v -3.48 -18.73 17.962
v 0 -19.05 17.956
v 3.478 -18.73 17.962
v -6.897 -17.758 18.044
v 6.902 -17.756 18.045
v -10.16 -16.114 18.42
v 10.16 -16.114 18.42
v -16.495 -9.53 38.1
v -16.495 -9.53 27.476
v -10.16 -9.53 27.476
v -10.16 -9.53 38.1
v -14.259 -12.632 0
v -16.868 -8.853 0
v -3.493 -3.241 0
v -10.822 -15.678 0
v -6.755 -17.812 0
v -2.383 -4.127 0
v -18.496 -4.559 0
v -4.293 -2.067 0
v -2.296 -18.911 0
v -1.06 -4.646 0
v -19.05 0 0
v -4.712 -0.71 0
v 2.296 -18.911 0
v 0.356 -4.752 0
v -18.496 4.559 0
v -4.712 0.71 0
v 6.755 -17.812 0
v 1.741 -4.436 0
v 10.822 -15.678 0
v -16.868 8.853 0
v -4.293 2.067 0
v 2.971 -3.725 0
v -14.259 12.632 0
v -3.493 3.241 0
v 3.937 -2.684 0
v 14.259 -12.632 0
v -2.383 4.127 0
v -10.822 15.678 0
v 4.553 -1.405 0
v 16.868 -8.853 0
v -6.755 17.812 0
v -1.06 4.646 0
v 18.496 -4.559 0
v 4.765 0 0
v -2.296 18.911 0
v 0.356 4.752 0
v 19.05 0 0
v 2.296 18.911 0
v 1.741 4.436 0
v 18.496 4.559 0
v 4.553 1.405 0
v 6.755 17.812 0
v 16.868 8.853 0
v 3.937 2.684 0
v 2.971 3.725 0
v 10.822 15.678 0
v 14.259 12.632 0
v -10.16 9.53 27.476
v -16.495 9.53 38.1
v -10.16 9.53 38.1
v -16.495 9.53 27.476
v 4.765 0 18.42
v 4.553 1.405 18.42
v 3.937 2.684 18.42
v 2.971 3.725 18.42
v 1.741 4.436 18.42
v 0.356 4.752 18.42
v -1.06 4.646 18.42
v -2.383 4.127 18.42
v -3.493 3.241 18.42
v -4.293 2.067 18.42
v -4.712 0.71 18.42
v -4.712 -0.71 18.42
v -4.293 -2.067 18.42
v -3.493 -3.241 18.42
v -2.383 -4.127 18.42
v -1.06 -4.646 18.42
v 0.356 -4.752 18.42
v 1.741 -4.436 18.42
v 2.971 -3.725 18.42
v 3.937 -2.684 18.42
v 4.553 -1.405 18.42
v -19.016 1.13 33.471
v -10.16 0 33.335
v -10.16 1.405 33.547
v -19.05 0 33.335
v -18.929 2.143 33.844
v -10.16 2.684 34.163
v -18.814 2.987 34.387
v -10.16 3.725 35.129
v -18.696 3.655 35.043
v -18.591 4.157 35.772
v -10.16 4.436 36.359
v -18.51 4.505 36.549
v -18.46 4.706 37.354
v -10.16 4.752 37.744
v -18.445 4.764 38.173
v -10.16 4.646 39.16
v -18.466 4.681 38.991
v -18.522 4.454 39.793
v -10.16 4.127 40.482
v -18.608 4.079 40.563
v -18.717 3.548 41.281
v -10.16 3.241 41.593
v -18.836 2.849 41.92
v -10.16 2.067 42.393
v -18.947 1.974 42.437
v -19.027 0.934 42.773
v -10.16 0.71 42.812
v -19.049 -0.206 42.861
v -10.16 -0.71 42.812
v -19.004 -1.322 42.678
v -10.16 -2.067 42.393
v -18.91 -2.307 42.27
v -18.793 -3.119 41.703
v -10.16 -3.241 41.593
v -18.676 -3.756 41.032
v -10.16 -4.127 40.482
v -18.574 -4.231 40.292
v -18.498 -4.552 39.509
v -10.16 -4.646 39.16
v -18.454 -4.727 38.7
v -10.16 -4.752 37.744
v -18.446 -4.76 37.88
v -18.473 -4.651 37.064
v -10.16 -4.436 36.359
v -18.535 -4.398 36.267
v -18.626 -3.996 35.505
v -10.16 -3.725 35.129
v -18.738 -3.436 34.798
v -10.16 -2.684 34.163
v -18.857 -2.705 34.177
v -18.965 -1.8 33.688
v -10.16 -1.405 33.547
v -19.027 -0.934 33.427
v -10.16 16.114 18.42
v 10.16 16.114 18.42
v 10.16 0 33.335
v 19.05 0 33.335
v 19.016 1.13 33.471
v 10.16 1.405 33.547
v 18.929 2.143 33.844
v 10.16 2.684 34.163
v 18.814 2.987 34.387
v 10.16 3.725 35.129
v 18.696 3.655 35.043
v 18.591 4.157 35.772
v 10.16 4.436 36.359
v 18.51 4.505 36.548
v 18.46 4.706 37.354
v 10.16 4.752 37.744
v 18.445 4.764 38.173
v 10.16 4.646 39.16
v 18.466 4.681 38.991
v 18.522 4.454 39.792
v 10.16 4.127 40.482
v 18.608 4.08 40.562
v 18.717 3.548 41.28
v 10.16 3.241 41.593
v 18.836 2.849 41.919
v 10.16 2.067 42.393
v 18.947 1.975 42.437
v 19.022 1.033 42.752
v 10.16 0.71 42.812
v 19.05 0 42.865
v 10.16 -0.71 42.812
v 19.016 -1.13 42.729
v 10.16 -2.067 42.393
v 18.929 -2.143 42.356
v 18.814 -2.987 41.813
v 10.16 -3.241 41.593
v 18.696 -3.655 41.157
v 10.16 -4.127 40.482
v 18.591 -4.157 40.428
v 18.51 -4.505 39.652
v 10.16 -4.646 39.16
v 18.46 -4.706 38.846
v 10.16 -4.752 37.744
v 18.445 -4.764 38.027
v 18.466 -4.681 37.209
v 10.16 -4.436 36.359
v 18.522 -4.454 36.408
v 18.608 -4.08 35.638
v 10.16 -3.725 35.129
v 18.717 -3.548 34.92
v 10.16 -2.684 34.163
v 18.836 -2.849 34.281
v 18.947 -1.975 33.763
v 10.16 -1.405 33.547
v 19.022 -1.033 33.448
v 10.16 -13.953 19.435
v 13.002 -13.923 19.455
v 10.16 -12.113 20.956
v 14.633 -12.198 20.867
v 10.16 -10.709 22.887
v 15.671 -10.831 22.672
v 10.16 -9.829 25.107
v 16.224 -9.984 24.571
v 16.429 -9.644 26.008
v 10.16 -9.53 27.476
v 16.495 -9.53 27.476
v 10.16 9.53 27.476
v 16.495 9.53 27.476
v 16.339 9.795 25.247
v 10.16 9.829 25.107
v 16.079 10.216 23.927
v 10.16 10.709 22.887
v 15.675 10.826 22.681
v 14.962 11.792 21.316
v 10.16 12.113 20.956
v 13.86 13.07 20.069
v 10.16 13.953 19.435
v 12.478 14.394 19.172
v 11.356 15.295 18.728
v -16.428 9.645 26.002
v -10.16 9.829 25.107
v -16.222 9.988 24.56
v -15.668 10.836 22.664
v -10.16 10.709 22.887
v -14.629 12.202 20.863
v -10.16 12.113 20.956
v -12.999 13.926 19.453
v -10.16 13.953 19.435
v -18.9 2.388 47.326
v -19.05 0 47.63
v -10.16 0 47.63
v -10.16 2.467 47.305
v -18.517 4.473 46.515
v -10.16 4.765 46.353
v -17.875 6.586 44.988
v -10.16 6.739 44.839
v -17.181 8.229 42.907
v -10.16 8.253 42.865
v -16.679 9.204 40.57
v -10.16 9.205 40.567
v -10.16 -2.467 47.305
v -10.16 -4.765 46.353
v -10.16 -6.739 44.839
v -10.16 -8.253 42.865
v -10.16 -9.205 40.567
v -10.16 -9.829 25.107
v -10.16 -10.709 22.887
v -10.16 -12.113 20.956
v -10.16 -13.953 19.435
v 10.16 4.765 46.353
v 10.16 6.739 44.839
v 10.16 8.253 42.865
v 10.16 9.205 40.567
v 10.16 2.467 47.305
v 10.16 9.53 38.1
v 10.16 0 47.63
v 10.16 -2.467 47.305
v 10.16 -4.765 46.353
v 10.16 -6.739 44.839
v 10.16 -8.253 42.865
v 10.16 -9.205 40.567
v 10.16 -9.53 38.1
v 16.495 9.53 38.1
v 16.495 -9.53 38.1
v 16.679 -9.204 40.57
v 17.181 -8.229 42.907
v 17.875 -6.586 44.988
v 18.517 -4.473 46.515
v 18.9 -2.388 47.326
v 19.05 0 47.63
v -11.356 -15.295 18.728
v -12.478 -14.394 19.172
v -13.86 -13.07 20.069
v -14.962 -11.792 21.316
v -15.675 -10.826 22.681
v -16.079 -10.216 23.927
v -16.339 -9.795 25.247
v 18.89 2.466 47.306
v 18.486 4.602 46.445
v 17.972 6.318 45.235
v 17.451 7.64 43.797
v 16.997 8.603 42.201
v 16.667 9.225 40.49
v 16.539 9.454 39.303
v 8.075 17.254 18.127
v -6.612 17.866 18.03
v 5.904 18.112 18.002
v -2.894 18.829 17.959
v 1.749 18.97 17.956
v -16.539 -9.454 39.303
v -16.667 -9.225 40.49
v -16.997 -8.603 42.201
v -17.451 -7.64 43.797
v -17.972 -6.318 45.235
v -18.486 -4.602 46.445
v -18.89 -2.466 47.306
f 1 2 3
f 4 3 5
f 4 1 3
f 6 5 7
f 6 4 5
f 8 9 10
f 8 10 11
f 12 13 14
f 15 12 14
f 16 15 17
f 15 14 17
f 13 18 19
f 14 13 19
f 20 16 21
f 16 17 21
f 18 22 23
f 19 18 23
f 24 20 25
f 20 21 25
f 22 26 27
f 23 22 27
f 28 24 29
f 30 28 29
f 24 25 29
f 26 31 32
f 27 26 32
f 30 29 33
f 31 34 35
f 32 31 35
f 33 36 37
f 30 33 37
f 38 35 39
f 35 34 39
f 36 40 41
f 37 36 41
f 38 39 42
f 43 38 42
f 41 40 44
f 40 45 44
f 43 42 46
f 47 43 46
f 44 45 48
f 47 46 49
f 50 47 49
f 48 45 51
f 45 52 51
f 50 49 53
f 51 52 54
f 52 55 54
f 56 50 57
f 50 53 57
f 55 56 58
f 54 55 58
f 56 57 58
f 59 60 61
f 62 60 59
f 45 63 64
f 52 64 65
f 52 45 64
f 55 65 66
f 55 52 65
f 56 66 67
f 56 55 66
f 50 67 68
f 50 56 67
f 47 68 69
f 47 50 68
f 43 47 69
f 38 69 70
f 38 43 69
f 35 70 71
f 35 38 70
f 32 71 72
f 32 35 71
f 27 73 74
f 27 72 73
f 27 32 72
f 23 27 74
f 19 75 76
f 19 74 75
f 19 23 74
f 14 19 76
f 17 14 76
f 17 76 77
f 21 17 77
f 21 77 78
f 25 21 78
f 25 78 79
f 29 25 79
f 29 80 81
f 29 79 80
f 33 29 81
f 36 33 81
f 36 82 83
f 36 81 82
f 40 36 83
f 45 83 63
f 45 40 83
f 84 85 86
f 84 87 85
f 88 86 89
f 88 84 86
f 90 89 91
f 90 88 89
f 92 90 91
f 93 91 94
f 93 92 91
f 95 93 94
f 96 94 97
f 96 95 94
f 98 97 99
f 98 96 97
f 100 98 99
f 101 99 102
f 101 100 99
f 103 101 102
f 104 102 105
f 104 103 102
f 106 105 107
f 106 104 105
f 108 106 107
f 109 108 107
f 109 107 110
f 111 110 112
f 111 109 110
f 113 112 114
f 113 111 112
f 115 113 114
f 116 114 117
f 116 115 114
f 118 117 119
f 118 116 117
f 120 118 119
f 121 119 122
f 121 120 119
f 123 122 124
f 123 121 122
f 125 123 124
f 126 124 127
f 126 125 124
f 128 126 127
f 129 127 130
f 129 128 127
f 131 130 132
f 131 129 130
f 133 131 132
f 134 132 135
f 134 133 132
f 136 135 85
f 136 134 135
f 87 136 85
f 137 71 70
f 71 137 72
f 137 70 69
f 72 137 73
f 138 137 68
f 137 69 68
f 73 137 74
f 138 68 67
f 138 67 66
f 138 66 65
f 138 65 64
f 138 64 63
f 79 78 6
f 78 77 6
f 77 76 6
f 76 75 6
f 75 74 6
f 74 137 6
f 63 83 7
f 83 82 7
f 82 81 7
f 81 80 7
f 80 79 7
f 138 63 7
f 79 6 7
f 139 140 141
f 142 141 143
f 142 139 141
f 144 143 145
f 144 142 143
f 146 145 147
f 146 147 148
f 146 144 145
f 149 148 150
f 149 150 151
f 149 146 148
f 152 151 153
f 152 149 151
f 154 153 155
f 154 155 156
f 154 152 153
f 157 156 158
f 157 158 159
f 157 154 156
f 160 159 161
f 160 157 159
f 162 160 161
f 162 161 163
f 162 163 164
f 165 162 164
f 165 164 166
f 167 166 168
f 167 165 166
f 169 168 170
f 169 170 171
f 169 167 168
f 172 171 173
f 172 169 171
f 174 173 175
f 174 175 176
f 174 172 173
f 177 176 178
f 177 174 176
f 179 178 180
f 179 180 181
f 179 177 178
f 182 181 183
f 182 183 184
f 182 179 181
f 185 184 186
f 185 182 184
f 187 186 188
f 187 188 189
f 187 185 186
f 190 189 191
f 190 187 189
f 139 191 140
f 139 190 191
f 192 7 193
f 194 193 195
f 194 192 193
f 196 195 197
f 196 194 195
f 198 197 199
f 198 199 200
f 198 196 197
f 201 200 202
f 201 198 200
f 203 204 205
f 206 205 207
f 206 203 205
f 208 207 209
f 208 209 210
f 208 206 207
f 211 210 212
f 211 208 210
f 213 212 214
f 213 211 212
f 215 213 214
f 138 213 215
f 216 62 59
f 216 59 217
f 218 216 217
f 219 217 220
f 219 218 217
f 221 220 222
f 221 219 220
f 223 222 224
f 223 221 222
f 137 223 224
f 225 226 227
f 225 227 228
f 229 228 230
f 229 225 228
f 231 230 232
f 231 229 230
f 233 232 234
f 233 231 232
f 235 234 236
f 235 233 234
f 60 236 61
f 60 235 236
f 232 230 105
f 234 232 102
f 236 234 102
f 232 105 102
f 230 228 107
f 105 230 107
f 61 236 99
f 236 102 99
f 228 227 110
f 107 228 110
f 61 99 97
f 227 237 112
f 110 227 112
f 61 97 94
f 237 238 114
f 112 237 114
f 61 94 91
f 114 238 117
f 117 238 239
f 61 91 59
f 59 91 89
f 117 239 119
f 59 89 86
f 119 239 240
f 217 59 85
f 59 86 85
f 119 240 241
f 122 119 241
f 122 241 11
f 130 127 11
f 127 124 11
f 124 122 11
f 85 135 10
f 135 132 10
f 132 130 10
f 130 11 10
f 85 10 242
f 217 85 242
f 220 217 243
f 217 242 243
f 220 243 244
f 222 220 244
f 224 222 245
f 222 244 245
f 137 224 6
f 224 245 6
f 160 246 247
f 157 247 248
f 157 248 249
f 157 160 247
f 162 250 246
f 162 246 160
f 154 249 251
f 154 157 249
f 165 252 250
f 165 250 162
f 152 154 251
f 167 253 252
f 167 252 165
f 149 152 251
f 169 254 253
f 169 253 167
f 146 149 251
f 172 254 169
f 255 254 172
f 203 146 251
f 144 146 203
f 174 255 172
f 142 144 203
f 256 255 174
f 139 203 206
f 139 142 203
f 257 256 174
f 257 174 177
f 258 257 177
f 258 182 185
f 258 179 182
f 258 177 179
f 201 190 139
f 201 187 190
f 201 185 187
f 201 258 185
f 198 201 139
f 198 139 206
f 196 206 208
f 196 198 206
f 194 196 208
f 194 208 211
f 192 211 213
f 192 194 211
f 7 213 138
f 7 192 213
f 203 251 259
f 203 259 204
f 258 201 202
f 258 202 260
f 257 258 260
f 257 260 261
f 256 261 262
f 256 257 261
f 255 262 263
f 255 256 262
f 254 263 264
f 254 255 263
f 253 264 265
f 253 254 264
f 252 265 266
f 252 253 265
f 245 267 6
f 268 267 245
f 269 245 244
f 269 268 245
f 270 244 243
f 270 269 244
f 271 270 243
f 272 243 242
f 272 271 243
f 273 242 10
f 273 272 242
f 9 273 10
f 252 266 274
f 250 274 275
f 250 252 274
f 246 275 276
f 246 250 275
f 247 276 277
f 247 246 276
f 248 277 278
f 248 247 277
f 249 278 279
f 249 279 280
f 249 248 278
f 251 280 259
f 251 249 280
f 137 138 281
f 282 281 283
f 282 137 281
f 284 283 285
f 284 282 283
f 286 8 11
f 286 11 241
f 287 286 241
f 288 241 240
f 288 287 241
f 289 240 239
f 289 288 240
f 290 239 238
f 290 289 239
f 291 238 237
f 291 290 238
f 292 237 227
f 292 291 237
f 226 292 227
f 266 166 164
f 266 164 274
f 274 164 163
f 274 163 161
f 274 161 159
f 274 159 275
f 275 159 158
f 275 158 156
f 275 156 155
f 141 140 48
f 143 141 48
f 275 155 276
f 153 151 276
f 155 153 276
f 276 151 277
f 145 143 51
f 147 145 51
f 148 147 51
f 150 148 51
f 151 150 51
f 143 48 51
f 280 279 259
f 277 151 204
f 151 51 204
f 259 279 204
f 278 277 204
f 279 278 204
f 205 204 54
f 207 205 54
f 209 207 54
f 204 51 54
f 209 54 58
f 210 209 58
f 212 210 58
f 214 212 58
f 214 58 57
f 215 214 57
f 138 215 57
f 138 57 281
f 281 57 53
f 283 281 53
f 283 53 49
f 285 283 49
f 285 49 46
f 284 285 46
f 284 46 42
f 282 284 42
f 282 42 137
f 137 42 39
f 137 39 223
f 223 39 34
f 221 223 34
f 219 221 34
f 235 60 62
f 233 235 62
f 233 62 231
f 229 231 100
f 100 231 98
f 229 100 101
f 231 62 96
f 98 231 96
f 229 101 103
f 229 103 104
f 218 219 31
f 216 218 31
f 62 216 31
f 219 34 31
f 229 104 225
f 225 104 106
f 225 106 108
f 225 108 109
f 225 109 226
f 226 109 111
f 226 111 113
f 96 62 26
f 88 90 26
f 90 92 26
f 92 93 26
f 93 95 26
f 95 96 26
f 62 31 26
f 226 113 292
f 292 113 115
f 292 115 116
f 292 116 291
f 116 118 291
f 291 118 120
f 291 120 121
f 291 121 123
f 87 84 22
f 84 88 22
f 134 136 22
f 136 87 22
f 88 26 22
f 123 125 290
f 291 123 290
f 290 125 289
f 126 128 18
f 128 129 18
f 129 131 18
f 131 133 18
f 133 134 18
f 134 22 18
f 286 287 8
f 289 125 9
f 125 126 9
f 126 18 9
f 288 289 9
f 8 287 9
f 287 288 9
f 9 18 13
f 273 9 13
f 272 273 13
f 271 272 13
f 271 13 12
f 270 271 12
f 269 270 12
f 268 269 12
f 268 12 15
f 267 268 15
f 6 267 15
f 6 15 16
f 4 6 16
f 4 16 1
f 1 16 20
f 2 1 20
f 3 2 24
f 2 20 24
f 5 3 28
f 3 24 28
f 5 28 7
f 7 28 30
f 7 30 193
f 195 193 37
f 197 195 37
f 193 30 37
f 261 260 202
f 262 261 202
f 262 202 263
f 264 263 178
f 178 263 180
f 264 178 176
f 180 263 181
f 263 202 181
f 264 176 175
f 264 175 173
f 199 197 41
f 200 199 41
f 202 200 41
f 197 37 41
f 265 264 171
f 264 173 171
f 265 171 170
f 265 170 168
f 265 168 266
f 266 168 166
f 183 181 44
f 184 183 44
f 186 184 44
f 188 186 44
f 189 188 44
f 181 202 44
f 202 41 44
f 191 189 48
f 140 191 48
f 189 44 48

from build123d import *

# Parameters (mm, degrees)
SKETCH1_R               = 19.05
SKETCH1_R_2             = 4.765
BOSS_EXTRUDE1_DEPTH     = 47.63
CUT_EXTRUDE1_DEPTH      = 55.721311205
CUT_EXTRUDE1_DEPTH_BACK = 55.721311205
SKETCH2_W               = 20.32
SKETCH2_H               = 29.21
CUT_EXTRUDE3_DEPTH      = 55.721311205
CUT_EXTRUDE3_DEPTH_BACK = 55.721311205
CUT_EXTRUDE4_DEPTH      = 55.721311362
CUT_EXTRUDE4_DEPTH_BACK = 55.721311362
SKETCH3_5_R             = 4.765


with BuildPart() as part:
    # Sketch1 → Boss-Extrude1 (new body)
    with BuildSketch(Plane.XY):
        Circle(SKETCH1_R)
        Circle(SKETCH1_R_2, mode=Mode.SUBTRACT)
    extrude(amount=BOSS_EXTRUDE1_DEPTH)

    # Sketch2 → Cut-Extrude1 (cut, two sides: drawn at the far end of the back side and taken through both)
    with BuildSketch(Plane(origin=(0, 0, 0), x_dir=(1, 0, 0), z_dir=(0, 1, 0)).offset(-CUT_EXTRUDE1_DEPTH_BACK)):
        with Locations((0, -33.025)):
            Rectangle(SKETCH2_W, SKETCH2_H)
    extrude(amount=CUT_EXTRUDE1_DEPTH + CUT_EXTRUDE1_DEPTH_BACK, mode=Mode.SUBTRACT)

    # Sketch3 → Cut-Extrude3 (cut, two sides: drawn at the far end of the back side and taken through both)
    with BuildSketch(Plane(origin=(0, 0, 0), x_dir=(0, 0, -1), z_dir=(1, 0, 0)).offset(-CUT_EXTRUDE3_DEPTH_BACK)):
        with BuildLine():
            Line((-55.897546117, 9.53), (-47.63, 9.53))
            Line((-47.63, 9.53), (-47.63, 0))
            ThreePointArc((-47.63, 0), (-44.838727625, 6.738727625), (-38.1, 9.53))
            Line((-38.1, 9.53), (-27.476114037, 9.53))
            ThreePointArc((-27.476114037, 9.53), (-20.74445748, 12.318343443), (-17.956114037, 19.05))
            Line((-17.956114037, 19.05), (-47.497981878, 20.575601986))
            Line((-47.497981878, 20.575601986), (-55.897546117, 9.53))
        make_face()
        with BuildLine():
            ThreePointArc((-38.1, -9.53), (-44.838727625, -6.738727625), (-47.63, 0))
            Line((-47.63, 0), (-47.63, -9.53))
            Line((-47.63, -9.53), (-55.897546117, -9.53))
            Line((-55.897546117, -9.53), (-47.497981878, -20.575601986))
            Line((-47.497981878, -20.575601986), (-17.956114037, -19.05))
            ThreePointArc((-17.956114037, -19.05), (-20.74445748, -12.318343443), (-27.476114037, -9.53))
            Line((-27.476114037, -9.53), (-38.1, -9.53))
        make_face()
    extrude(amount=CUT_EXTRUDE3_DEPTH + CUT_EXTRUDE3_DEPTH_BACK, mode=Mode.SUBTRACT)

    # Sketch3<5> → Cut-Extrude4 (cut, two sides: drawn at the far end of the back side and taken through both)
    with BuildSketch(Plane(origin=(0, 0, 0), x_dir=(0, 0, -1), z_dir=(1, 0, 0)).offset(-CUT_EXTRUDE4_DEPTH_BACK)):
        with Locations((-38.1, 0)):
            Circle(SKETCH3_5_R)
    extrude(amount=CUT_EXTRUDE4_DEPTH + CUT_EXTRUDE4_DEPTH_BACK, mode=Mode.SUBTRACT)


solid = part.part
